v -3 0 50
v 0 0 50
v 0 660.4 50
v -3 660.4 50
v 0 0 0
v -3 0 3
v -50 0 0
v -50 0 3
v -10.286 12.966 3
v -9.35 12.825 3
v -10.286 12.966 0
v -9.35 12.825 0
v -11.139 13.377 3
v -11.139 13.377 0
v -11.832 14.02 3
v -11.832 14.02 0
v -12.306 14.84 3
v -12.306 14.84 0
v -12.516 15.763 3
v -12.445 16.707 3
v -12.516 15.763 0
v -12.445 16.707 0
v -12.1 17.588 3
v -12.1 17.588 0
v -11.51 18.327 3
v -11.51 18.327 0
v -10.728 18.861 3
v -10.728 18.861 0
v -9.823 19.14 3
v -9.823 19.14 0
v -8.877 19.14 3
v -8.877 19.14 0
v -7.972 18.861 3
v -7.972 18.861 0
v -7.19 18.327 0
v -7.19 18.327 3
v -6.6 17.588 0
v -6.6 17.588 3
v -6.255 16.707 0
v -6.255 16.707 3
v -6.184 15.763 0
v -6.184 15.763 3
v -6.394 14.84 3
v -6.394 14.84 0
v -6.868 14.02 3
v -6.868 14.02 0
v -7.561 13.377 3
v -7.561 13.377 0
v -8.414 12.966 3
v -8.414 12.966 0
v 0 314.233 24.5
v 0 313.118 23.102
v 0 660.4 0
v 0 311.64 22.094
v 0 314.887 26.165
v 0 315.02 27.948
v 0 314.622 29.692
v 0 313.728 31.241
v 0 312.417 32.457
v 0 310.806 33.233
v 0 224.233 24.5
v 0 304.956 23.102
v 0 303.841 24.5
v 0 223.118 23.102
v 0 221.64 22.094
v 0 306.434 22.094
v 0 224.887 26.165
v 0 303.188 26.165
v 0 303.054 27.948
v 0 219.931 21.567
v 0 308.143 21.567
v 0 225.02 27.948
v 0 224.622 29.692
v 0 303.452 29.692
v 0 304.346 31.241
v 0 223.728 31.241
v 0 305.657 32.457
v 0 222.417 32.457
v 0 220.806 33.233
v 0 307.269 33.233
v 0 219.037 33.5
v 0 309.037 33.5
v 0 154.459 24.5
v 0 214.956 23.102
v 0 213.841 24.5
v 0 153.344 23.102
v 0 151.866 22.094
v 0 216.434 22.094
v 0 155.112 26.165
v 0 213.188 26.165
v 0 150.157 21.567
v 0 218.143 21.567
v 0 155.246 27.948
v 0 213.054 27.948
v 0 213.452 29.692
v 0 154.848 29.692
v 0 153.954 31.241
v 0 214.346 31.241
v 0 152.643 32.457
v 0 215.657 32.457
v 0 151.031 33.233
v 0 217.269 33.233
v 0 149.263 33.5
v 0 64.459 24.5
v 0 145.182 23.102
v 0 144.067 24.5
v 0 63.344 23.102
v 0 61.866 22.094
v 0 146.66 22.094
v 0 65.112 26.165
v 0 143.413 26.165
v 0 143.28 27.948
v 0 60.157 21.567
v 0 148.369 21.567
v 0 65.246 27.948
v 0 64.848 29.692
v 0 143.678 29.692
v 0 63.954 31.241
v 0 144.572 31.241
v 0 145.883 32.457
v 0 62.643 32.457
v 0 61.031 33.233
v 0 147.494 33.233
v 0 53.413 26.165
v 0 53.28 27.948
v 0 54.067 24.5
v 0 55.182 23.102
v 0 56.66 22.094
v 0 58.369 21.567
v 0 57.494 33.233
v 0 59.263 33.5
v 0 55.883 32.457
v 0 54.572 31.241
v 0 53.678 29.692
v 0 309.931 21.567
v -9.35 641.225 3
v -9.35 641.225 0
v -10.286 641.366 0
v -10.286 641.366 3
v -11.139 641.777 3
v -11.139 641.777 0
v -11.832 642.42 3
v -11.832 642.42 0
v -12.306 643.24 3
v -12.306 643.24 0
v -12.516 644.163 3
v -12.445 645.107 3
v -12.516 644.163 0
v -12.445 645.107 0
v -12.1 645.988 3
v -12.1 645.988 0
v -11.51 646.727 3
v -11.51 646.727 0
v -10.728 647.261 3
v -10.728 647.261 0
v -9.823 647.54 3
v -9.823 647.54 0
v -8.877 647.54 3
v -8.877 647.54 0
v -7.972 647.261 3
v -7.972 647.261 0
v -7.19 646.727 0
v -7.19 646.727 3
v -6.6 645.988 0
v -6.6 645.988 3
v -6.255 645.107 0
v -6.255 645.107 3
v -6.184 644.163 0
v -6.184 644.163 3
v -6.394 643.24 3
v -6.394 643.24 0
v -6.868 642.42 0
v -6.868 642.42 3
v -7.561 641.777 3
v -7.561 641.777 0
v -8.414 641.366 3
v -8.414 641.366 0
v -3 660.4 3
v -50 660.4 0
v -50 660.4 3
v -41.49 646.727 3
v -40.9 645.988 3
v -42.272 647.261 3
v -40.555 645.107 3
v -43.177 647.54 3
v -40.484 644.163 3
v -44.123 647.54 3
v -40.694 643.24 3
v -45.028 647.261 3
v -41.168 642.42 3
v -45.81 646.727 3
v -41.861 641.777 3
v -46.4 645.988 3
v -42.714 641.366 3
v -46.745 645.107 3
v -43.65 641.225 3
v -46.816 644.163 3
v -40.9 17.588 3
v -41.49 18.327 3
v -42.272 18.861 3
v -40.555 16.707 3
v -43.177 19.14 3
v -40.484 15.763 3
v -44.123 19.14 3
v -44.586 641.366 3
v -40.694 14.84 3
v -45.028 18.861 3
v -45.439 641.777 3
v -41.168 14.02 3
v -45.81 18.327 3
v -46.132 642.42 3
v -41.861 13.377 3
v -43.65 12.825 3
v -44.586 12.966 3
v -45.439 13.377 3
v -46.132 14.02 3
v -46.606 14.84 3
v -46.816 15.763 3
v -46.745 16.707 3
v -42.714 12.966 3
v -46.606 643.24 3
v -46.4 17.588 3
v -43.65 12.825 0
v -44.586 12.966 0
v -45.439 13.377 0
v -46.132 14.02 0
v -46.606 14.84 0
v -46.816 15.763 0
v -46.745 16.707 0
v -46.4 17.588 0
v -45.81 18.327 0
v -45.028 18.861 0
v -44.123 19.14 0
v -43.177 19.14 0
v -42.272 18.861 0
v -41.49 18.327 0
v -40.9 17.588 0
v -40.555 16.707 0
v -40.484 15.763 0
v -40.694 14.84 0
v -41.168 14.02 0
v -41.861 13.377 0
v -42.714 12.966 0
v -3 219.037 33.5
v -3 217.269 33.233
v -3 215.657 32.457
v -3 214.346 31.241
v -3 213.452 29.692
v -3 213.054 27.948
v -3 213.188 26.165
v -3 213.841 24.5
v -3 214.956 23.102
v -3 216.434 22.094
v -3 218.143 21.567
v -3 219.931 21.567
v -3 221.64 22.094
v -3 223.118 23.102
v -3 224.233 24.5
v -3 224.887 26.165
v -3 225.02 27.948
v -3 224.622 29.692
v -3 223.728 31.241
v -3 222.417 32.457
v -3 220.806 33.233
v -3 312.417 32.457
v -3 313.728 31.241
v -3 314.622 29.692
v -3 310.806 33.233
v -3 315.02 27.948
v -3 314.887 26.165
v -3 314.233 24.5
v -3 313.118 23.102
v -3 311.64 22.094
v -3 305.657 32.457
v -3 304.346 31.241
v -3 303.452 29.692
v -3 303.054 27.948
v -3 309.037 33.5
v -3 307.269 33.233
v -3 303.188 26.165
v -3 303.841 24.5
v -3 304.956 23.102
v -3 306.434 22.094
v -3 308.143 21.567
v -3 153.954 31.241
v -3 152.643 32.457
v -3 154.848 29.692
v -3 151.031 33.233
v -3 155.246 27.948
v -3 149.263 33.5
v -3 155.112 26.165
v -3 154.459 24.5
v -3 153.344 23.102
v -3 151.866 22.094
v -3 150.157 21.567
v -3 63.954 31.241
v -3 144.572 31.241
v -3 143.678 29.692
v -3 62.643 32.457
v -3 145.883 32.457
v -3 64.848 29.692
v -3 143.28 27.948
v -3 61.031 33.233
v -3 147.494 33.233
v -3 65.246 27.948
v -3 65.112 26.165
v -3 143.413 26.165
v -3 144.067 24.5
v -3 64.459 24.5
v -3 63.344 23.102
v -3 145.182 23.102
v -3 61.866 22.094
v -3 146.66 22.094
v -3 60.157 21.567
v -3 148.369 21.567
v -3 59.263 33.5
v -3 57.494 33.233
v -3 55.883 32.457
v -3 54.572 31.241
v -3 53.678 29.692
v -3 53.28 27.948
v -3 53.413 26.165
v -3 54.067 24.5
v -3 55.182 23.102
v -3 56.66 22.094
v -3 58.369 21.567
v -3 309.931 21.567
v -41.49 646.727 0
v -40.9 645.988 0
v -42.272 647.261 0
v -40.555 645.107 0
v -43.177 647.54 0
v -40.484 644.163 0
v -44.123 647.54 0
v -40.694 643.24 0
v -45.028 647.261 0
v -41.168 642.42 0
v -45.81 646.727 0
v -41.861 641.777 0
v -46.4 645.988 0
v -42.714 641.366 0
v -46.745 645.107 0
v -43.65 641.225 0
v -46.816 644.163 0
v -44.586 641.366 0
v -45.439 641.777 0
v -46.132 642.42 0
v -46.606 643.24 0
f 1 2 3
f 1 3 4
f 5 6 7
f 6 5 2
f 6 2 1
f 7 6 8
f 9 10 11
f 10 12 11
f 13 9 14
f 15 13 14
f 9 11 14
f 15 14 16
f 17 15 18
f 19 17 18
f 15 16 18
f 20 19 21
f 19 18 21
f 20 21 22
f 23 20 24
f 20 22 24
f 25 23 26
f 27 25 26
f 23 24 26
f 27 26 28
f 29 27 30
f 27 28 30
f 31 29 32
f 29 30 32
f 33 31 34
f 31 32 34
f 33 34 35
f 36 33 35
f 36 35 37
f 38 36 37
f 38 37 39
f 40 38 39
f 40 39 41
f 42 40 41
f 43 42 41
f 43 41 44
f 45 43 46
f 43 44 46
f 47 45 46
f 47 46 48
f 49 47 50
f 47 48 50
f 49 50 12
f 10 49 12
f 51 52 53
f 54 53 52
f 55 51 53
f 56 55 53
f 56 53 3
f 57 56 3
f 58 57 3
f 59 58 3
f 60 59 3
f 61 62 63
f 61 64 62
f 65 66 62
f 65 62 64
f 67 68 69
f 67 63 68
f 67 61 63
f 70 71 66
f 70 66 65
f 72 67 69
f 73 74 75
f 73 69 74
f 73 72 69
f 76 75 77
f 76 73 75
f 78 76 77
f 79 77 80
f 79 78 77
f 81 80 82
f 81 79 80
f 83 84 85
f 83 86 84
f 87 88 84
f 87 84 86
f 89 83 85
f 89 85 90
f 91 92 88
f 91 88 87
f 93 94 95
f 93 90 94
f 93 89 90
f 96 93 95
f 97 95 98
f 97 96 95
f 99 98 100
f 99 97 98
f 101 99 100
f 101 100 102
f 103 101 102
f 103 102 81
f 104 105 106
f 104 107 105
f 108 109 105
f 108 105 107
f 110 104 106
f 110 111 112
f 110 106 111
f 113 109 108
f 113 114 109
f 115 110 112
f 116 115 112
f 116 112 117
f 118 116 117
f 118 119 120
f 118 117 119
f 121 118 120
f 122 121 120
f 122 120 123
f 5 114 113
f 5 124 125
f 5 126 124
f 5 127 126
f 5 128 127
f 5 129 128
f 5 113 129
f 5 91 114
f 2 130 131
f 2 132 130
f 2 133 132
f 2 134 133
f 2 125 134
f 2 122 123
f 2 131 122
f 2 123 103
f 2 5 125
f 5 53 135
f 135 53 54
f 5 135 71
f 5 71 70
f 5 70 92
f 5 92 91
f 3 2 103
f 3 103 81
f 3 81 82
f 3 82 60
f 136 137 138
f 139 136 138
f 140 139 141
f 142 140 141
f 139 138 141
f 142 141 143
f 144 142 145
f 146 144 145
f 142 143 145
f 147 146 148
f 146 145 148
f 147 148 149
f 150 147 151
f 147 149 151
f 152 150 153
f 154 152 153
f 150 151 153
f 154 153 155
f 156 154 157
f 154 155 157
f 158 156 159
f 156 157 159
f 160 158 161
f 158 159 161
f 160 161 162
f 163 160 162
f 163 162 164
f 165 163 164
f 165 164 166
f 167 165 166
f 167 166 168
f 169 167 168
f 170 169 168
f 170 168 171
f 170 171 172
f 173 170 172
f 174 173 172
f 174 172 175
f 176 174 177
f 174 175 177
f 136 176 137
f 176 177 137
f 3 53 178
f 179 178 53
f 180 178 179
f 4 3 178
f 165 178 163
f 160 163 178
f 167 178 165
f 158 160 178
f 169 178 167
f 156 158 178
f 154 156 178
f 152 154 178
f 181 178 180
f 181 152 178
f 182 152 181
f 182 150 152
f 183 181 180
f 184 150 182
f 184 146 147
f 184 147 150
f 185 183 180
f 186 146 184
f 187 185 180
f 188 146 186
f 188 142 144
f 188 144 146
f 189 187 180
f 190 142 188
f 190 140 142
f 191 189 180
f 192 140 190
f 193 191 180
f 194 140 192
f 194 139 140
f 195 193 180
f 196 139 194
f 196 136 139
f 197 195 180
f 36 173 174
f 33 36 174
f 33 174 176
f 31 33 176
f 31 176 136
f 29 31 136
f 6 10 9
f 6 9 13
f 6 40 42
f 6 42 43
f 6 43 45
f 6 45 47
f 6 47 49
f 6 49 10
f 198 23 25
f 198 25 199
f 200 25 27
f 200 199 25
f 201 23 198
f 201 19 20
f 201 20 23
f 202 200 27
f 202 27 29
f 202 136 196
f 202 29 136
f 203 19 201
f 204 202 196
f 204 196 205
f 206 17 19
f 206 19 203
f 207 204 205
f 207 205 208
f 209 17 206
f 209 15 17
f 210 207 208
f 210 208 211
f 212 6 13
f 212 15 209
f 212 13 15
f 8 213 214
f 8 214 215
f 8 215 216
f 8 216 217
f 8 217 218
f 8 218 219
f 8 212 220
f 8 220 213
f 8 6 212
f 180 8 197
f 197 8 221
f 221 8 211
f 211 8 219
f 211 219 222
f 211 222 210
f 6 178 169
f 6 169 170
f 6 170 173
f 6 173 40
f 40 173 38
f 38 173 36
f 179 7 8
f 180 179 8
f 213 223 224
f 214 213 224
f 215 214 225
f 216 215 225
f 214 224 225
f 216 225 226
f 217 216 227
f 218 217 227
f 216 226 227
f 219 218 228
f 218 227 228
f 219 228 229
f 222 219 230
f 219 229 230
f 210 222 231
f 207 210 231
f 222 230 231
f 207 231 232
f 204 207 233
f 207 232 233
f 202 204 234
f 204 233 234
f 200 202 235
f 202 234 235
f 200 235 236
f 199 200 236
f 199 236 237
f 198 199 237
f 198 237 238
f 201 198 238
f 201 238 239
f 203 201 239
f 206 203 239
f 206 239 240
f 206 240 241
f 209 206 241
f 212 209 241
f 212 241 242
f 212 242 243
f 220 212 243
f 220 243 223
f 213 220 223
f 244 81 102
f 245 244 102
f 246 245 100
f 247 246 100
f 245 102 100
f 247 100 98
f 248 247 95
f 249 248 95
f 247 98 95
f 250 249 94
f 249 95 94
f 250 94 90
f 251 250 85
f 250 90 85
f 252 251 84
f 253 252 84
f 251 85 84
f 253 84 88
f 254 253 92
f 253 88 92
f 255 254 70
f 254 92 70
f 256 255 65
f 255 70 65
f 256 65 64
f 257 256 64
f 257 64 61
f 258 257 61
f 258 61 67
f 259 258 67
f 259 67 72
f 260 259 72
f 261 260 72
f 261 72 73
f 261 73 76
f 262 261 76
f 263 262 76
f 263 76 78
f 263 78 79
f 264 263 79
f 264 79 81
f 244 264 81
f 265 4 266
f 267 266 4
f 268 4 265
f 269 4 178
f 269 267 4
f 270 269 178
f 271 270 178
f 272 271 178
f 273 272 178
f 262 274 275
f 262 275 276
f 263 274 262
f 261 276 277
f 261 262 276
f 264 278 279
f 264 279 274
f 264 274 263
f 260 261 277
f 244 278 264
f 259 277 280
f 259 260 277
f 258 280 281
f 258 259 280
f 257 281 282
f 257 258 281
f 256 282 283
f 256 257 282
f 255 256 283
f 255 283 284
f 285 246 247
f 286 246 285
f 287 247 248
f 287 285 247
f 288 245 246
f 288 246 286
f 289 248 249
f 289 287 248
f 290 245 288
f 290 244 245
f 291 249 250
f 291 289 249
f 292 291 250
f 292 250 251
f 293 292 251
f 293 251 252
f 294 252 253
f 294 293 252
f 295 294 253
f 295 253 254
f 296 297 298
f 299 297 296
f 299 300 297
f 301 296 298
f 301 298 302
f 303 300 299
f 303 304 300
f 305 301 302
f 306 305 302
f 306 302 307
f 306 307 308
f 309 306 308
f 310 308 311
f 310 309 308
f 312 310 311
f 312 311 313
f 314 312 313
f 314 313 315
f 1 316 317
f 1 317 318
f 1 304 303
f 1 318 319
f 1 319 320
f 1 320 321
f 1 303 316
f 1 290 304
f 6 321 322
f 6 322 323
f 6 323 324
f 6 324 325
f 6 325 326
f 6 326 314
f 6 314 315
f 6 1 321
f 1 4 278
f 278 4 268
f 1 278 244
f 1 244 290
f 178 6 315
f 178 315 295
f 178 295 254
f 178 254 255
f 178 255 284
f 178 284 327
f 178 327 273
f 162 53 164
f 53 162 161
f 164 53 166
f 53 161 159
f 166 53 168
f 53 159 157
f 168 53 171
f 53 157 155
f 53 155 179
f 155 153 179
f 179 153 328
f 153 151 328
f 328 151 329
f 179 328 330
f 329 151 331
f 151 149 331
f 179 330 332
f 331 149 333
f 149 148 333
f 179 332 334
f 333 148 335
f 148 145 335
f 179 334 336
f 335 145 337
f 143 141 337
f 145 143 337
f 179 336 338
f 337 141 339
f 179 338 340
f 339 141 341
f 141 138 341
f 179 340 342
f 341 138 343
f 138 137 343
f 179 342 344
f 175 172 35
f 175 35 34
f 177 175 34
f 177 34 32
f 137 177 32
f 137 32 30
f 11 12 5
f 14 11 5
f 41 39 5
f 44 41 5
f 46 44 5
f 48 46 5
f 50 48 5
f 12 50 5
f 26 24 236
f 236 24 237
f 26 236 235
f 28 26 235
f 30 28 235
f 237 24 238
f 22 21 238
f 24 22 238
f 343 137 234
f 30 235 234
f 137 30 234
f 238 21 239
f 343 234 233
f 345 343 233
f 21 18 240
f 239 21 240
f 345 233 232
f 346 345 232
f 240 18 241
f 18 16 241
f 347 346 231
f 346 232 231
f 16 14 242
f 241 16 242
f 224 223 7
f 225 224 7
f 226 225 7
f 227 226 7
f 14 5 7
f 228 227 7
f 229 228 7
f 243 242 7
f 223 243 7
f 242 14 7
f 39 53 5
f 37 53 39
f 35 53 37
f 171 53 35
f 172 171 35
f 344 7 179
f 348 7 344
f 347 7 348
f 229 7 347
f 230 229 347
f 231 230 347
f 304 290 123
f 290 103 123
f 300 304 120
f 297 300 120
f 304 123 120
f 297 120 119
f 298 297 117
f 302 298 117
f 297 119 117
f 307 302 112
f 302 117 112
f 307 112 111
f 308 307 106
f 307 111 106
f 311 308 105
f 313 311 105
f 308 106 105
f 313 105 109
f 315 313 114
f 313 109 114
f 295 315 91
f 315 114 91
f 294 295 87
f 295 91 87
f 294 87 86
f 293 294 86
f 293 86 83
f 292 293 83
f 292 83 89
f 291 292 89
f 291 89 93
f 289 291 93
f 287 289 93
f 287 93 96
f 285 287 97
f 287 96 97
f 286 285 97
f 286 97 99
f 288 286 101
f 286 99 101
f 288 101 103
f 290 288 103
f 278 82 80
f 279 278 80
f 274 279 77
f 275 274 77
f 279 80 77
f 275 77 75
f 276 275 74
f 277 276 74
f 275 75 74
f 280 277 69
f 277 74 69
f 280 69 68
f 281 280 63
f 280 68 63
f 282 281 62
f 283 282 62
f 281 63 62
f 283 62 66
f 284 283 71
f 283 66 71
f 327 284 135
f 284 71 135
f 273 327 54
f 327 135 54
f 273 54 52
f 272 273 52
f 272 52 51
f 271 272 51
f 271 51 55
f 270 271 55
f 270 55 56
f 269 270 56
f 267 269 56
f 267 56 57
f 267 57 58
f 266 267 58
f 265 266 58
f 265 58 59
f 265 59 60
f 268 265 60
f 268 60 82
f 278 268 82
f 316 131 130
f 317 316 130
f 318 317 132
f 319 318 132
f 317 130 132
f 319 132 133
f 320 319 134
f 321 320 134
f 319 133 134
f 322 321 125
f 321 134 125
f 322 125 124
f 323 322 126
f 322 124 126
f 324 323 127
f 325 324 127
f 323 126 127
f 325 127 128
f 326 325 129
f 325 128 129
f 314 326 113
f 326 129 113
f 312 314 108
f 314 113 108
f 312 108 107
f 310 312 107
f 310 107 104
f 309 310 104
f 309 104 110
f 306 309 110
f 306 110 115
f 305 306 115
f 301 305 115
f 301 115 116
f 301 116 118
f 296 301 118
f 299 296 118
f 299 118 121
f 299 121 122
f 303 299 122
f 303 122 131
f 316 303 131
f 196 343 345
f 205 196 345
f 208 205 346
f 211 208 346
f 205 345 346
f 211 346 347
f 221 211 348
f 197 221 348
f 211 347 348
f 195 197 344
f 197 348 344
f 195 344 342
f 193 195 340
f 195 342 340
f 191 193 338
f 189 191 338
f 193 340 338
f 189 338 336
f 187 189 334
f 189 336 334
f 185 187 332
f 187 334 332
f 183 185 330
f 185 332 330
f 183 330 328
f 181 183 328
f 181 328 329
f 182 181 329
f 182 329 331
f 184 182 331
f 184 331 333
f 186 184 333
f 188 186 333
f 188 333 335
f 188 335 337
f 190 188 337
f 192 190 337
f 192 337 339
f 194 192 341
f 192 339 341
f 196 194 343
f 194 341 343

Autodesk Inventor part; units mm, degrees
ref_plane "YZ Plane" through (0, 0, 0) normal (1, 0, 0) x (0, 1, 0)
ref_plane "XZ Plane" through (0, 0, 0) normal (0, 1, 0) x (-1, 0, 0)
ref_plane "XY Plane" through (0, 0, 0) normal (0, 0, 1) x (1, 0, 0)
sketch "Sketch1" plane through (0, 0, 0) normal (0, 1, 0) x (-1, 0, 0)
  line L0 (0, 0) -> (50, 0)
  line L1 (50, 0) -> (50, 3)
  line L2 (0, 0) -> (0, 50)
  line L3 (0, 50) -> (3, 50)
  line L4 (3, 50) -> (3, 3)
  line L5 (3, 3) -> (50, 3)
  dimension "d0" = 50
  dimension "d1" = 3
  dimension "d2" = 50
  dimension "d3" = 3
extrude "Extrusion1" add sketch "Sketch1" along normal blind 660.4
sketch "Sketch5" plane through (-3, 0, 3) normal (-1, 0, 0) x (0, 0, 1)
  circle A0 centre (24.5, 59.2629) radius 4.8387
  circle A1 centre (24.5, 149.2629) radius 4.8387
  circle A2 centre (24.5, 219.0371) radius 4.8387
  circle A3 centre (24.5, 309.0371) radius 4.8387
  line L0 (0, 0) -> (47, 0) projected
  line L1 (0, 0) -> (0, 660.4) projected
  line L2 (-136.6387, 184.15) -> (192.6114, 184.15) construction
  line L3 (47, 0) -> (47, 660.4) projected
  line L4 (-3, 0) -> (-3, 660.4) construction
  dimension "d68" = 90
  dimension "d70" = 90
  dimension "d71" = 69.7742
  dimension "d72" = 184.15
  dimension "d73" = 34.8871
  dimension "d74" = 34.8871
  dimension "d78" = 59.2629
  dimension "d79" = 50
  dimension "d102" = 22.5
sketch "Sketch6" plane through (-50, 0, 3) normal (0, 0, 1) x (1, 0, 0)
  line L0 (0, 0) -> (47, 0) projected
  line L1 (47, 0) -> (47, 660.4) projected
  line L2 (0, 660.4) -> (47, 660.4) projected
  line L3 (0, 0) -> (0, 660.4) projected
  line L4 (0, 0) -> (47, 0) projected
  line L5 (47, 0) -> (47, 660.4) projected
  line L6 (0, 660.4) -> (47, 660.4) projected
  line L7 (0, 0) -> (0, 660.4) projected
  line L8 (50, 0) -> (50, 660.4) projected
  line L9 (47, 660.4) -> (50, 660.4) projected
  line L10 (0, 644.4) -> (50, 644.4) construction
  circle A0 centre (6.35, 644.4) radius 3.175
  circle A1 centre (40.65, 644.4) radius 3.175
  line L11 (50, 16) -> (0, 16) construction
  circle A2 centre (40.65, 16) radius 3.175
  circle A3 centre (6.35, 16) radius 3.175
  dimension "d80" = 16
  dimension "d81" = 6.35
  dimension "d82" = 6.35
  dimension "d83" = 6.35
  dimension "d84" = 6.35
  dimension "d85" = 16
  dimension "d86" = 6.35
  dimension "d87" = 6.35
hole "Hole1" at (-9.35, 644.4, 3) at (-43.65, 644.4, 3) at (-9.35, 16, 3) at (-43.65, 16, 3) direction (0, 0, -1) diameter 6.35 depth 3 tip angle 118
hole "Hole2" at (-3, 59.2629, 27.5) at (-3, 149.2629, 27.5) at (-3, 219.0371, 27.5) at (-3, 309.0371, 27.5) direction (1, 0, 0) diameter 12 depth 3 tip angle 118
equation "\"d68\" = d70"
equation "\"d73\" = 0.5 * d71"
equation "\"d74\" = 0.5 * d71"
properties part number "26in Angle Channel CIM Mount Left" material "Aluminum 6061"
